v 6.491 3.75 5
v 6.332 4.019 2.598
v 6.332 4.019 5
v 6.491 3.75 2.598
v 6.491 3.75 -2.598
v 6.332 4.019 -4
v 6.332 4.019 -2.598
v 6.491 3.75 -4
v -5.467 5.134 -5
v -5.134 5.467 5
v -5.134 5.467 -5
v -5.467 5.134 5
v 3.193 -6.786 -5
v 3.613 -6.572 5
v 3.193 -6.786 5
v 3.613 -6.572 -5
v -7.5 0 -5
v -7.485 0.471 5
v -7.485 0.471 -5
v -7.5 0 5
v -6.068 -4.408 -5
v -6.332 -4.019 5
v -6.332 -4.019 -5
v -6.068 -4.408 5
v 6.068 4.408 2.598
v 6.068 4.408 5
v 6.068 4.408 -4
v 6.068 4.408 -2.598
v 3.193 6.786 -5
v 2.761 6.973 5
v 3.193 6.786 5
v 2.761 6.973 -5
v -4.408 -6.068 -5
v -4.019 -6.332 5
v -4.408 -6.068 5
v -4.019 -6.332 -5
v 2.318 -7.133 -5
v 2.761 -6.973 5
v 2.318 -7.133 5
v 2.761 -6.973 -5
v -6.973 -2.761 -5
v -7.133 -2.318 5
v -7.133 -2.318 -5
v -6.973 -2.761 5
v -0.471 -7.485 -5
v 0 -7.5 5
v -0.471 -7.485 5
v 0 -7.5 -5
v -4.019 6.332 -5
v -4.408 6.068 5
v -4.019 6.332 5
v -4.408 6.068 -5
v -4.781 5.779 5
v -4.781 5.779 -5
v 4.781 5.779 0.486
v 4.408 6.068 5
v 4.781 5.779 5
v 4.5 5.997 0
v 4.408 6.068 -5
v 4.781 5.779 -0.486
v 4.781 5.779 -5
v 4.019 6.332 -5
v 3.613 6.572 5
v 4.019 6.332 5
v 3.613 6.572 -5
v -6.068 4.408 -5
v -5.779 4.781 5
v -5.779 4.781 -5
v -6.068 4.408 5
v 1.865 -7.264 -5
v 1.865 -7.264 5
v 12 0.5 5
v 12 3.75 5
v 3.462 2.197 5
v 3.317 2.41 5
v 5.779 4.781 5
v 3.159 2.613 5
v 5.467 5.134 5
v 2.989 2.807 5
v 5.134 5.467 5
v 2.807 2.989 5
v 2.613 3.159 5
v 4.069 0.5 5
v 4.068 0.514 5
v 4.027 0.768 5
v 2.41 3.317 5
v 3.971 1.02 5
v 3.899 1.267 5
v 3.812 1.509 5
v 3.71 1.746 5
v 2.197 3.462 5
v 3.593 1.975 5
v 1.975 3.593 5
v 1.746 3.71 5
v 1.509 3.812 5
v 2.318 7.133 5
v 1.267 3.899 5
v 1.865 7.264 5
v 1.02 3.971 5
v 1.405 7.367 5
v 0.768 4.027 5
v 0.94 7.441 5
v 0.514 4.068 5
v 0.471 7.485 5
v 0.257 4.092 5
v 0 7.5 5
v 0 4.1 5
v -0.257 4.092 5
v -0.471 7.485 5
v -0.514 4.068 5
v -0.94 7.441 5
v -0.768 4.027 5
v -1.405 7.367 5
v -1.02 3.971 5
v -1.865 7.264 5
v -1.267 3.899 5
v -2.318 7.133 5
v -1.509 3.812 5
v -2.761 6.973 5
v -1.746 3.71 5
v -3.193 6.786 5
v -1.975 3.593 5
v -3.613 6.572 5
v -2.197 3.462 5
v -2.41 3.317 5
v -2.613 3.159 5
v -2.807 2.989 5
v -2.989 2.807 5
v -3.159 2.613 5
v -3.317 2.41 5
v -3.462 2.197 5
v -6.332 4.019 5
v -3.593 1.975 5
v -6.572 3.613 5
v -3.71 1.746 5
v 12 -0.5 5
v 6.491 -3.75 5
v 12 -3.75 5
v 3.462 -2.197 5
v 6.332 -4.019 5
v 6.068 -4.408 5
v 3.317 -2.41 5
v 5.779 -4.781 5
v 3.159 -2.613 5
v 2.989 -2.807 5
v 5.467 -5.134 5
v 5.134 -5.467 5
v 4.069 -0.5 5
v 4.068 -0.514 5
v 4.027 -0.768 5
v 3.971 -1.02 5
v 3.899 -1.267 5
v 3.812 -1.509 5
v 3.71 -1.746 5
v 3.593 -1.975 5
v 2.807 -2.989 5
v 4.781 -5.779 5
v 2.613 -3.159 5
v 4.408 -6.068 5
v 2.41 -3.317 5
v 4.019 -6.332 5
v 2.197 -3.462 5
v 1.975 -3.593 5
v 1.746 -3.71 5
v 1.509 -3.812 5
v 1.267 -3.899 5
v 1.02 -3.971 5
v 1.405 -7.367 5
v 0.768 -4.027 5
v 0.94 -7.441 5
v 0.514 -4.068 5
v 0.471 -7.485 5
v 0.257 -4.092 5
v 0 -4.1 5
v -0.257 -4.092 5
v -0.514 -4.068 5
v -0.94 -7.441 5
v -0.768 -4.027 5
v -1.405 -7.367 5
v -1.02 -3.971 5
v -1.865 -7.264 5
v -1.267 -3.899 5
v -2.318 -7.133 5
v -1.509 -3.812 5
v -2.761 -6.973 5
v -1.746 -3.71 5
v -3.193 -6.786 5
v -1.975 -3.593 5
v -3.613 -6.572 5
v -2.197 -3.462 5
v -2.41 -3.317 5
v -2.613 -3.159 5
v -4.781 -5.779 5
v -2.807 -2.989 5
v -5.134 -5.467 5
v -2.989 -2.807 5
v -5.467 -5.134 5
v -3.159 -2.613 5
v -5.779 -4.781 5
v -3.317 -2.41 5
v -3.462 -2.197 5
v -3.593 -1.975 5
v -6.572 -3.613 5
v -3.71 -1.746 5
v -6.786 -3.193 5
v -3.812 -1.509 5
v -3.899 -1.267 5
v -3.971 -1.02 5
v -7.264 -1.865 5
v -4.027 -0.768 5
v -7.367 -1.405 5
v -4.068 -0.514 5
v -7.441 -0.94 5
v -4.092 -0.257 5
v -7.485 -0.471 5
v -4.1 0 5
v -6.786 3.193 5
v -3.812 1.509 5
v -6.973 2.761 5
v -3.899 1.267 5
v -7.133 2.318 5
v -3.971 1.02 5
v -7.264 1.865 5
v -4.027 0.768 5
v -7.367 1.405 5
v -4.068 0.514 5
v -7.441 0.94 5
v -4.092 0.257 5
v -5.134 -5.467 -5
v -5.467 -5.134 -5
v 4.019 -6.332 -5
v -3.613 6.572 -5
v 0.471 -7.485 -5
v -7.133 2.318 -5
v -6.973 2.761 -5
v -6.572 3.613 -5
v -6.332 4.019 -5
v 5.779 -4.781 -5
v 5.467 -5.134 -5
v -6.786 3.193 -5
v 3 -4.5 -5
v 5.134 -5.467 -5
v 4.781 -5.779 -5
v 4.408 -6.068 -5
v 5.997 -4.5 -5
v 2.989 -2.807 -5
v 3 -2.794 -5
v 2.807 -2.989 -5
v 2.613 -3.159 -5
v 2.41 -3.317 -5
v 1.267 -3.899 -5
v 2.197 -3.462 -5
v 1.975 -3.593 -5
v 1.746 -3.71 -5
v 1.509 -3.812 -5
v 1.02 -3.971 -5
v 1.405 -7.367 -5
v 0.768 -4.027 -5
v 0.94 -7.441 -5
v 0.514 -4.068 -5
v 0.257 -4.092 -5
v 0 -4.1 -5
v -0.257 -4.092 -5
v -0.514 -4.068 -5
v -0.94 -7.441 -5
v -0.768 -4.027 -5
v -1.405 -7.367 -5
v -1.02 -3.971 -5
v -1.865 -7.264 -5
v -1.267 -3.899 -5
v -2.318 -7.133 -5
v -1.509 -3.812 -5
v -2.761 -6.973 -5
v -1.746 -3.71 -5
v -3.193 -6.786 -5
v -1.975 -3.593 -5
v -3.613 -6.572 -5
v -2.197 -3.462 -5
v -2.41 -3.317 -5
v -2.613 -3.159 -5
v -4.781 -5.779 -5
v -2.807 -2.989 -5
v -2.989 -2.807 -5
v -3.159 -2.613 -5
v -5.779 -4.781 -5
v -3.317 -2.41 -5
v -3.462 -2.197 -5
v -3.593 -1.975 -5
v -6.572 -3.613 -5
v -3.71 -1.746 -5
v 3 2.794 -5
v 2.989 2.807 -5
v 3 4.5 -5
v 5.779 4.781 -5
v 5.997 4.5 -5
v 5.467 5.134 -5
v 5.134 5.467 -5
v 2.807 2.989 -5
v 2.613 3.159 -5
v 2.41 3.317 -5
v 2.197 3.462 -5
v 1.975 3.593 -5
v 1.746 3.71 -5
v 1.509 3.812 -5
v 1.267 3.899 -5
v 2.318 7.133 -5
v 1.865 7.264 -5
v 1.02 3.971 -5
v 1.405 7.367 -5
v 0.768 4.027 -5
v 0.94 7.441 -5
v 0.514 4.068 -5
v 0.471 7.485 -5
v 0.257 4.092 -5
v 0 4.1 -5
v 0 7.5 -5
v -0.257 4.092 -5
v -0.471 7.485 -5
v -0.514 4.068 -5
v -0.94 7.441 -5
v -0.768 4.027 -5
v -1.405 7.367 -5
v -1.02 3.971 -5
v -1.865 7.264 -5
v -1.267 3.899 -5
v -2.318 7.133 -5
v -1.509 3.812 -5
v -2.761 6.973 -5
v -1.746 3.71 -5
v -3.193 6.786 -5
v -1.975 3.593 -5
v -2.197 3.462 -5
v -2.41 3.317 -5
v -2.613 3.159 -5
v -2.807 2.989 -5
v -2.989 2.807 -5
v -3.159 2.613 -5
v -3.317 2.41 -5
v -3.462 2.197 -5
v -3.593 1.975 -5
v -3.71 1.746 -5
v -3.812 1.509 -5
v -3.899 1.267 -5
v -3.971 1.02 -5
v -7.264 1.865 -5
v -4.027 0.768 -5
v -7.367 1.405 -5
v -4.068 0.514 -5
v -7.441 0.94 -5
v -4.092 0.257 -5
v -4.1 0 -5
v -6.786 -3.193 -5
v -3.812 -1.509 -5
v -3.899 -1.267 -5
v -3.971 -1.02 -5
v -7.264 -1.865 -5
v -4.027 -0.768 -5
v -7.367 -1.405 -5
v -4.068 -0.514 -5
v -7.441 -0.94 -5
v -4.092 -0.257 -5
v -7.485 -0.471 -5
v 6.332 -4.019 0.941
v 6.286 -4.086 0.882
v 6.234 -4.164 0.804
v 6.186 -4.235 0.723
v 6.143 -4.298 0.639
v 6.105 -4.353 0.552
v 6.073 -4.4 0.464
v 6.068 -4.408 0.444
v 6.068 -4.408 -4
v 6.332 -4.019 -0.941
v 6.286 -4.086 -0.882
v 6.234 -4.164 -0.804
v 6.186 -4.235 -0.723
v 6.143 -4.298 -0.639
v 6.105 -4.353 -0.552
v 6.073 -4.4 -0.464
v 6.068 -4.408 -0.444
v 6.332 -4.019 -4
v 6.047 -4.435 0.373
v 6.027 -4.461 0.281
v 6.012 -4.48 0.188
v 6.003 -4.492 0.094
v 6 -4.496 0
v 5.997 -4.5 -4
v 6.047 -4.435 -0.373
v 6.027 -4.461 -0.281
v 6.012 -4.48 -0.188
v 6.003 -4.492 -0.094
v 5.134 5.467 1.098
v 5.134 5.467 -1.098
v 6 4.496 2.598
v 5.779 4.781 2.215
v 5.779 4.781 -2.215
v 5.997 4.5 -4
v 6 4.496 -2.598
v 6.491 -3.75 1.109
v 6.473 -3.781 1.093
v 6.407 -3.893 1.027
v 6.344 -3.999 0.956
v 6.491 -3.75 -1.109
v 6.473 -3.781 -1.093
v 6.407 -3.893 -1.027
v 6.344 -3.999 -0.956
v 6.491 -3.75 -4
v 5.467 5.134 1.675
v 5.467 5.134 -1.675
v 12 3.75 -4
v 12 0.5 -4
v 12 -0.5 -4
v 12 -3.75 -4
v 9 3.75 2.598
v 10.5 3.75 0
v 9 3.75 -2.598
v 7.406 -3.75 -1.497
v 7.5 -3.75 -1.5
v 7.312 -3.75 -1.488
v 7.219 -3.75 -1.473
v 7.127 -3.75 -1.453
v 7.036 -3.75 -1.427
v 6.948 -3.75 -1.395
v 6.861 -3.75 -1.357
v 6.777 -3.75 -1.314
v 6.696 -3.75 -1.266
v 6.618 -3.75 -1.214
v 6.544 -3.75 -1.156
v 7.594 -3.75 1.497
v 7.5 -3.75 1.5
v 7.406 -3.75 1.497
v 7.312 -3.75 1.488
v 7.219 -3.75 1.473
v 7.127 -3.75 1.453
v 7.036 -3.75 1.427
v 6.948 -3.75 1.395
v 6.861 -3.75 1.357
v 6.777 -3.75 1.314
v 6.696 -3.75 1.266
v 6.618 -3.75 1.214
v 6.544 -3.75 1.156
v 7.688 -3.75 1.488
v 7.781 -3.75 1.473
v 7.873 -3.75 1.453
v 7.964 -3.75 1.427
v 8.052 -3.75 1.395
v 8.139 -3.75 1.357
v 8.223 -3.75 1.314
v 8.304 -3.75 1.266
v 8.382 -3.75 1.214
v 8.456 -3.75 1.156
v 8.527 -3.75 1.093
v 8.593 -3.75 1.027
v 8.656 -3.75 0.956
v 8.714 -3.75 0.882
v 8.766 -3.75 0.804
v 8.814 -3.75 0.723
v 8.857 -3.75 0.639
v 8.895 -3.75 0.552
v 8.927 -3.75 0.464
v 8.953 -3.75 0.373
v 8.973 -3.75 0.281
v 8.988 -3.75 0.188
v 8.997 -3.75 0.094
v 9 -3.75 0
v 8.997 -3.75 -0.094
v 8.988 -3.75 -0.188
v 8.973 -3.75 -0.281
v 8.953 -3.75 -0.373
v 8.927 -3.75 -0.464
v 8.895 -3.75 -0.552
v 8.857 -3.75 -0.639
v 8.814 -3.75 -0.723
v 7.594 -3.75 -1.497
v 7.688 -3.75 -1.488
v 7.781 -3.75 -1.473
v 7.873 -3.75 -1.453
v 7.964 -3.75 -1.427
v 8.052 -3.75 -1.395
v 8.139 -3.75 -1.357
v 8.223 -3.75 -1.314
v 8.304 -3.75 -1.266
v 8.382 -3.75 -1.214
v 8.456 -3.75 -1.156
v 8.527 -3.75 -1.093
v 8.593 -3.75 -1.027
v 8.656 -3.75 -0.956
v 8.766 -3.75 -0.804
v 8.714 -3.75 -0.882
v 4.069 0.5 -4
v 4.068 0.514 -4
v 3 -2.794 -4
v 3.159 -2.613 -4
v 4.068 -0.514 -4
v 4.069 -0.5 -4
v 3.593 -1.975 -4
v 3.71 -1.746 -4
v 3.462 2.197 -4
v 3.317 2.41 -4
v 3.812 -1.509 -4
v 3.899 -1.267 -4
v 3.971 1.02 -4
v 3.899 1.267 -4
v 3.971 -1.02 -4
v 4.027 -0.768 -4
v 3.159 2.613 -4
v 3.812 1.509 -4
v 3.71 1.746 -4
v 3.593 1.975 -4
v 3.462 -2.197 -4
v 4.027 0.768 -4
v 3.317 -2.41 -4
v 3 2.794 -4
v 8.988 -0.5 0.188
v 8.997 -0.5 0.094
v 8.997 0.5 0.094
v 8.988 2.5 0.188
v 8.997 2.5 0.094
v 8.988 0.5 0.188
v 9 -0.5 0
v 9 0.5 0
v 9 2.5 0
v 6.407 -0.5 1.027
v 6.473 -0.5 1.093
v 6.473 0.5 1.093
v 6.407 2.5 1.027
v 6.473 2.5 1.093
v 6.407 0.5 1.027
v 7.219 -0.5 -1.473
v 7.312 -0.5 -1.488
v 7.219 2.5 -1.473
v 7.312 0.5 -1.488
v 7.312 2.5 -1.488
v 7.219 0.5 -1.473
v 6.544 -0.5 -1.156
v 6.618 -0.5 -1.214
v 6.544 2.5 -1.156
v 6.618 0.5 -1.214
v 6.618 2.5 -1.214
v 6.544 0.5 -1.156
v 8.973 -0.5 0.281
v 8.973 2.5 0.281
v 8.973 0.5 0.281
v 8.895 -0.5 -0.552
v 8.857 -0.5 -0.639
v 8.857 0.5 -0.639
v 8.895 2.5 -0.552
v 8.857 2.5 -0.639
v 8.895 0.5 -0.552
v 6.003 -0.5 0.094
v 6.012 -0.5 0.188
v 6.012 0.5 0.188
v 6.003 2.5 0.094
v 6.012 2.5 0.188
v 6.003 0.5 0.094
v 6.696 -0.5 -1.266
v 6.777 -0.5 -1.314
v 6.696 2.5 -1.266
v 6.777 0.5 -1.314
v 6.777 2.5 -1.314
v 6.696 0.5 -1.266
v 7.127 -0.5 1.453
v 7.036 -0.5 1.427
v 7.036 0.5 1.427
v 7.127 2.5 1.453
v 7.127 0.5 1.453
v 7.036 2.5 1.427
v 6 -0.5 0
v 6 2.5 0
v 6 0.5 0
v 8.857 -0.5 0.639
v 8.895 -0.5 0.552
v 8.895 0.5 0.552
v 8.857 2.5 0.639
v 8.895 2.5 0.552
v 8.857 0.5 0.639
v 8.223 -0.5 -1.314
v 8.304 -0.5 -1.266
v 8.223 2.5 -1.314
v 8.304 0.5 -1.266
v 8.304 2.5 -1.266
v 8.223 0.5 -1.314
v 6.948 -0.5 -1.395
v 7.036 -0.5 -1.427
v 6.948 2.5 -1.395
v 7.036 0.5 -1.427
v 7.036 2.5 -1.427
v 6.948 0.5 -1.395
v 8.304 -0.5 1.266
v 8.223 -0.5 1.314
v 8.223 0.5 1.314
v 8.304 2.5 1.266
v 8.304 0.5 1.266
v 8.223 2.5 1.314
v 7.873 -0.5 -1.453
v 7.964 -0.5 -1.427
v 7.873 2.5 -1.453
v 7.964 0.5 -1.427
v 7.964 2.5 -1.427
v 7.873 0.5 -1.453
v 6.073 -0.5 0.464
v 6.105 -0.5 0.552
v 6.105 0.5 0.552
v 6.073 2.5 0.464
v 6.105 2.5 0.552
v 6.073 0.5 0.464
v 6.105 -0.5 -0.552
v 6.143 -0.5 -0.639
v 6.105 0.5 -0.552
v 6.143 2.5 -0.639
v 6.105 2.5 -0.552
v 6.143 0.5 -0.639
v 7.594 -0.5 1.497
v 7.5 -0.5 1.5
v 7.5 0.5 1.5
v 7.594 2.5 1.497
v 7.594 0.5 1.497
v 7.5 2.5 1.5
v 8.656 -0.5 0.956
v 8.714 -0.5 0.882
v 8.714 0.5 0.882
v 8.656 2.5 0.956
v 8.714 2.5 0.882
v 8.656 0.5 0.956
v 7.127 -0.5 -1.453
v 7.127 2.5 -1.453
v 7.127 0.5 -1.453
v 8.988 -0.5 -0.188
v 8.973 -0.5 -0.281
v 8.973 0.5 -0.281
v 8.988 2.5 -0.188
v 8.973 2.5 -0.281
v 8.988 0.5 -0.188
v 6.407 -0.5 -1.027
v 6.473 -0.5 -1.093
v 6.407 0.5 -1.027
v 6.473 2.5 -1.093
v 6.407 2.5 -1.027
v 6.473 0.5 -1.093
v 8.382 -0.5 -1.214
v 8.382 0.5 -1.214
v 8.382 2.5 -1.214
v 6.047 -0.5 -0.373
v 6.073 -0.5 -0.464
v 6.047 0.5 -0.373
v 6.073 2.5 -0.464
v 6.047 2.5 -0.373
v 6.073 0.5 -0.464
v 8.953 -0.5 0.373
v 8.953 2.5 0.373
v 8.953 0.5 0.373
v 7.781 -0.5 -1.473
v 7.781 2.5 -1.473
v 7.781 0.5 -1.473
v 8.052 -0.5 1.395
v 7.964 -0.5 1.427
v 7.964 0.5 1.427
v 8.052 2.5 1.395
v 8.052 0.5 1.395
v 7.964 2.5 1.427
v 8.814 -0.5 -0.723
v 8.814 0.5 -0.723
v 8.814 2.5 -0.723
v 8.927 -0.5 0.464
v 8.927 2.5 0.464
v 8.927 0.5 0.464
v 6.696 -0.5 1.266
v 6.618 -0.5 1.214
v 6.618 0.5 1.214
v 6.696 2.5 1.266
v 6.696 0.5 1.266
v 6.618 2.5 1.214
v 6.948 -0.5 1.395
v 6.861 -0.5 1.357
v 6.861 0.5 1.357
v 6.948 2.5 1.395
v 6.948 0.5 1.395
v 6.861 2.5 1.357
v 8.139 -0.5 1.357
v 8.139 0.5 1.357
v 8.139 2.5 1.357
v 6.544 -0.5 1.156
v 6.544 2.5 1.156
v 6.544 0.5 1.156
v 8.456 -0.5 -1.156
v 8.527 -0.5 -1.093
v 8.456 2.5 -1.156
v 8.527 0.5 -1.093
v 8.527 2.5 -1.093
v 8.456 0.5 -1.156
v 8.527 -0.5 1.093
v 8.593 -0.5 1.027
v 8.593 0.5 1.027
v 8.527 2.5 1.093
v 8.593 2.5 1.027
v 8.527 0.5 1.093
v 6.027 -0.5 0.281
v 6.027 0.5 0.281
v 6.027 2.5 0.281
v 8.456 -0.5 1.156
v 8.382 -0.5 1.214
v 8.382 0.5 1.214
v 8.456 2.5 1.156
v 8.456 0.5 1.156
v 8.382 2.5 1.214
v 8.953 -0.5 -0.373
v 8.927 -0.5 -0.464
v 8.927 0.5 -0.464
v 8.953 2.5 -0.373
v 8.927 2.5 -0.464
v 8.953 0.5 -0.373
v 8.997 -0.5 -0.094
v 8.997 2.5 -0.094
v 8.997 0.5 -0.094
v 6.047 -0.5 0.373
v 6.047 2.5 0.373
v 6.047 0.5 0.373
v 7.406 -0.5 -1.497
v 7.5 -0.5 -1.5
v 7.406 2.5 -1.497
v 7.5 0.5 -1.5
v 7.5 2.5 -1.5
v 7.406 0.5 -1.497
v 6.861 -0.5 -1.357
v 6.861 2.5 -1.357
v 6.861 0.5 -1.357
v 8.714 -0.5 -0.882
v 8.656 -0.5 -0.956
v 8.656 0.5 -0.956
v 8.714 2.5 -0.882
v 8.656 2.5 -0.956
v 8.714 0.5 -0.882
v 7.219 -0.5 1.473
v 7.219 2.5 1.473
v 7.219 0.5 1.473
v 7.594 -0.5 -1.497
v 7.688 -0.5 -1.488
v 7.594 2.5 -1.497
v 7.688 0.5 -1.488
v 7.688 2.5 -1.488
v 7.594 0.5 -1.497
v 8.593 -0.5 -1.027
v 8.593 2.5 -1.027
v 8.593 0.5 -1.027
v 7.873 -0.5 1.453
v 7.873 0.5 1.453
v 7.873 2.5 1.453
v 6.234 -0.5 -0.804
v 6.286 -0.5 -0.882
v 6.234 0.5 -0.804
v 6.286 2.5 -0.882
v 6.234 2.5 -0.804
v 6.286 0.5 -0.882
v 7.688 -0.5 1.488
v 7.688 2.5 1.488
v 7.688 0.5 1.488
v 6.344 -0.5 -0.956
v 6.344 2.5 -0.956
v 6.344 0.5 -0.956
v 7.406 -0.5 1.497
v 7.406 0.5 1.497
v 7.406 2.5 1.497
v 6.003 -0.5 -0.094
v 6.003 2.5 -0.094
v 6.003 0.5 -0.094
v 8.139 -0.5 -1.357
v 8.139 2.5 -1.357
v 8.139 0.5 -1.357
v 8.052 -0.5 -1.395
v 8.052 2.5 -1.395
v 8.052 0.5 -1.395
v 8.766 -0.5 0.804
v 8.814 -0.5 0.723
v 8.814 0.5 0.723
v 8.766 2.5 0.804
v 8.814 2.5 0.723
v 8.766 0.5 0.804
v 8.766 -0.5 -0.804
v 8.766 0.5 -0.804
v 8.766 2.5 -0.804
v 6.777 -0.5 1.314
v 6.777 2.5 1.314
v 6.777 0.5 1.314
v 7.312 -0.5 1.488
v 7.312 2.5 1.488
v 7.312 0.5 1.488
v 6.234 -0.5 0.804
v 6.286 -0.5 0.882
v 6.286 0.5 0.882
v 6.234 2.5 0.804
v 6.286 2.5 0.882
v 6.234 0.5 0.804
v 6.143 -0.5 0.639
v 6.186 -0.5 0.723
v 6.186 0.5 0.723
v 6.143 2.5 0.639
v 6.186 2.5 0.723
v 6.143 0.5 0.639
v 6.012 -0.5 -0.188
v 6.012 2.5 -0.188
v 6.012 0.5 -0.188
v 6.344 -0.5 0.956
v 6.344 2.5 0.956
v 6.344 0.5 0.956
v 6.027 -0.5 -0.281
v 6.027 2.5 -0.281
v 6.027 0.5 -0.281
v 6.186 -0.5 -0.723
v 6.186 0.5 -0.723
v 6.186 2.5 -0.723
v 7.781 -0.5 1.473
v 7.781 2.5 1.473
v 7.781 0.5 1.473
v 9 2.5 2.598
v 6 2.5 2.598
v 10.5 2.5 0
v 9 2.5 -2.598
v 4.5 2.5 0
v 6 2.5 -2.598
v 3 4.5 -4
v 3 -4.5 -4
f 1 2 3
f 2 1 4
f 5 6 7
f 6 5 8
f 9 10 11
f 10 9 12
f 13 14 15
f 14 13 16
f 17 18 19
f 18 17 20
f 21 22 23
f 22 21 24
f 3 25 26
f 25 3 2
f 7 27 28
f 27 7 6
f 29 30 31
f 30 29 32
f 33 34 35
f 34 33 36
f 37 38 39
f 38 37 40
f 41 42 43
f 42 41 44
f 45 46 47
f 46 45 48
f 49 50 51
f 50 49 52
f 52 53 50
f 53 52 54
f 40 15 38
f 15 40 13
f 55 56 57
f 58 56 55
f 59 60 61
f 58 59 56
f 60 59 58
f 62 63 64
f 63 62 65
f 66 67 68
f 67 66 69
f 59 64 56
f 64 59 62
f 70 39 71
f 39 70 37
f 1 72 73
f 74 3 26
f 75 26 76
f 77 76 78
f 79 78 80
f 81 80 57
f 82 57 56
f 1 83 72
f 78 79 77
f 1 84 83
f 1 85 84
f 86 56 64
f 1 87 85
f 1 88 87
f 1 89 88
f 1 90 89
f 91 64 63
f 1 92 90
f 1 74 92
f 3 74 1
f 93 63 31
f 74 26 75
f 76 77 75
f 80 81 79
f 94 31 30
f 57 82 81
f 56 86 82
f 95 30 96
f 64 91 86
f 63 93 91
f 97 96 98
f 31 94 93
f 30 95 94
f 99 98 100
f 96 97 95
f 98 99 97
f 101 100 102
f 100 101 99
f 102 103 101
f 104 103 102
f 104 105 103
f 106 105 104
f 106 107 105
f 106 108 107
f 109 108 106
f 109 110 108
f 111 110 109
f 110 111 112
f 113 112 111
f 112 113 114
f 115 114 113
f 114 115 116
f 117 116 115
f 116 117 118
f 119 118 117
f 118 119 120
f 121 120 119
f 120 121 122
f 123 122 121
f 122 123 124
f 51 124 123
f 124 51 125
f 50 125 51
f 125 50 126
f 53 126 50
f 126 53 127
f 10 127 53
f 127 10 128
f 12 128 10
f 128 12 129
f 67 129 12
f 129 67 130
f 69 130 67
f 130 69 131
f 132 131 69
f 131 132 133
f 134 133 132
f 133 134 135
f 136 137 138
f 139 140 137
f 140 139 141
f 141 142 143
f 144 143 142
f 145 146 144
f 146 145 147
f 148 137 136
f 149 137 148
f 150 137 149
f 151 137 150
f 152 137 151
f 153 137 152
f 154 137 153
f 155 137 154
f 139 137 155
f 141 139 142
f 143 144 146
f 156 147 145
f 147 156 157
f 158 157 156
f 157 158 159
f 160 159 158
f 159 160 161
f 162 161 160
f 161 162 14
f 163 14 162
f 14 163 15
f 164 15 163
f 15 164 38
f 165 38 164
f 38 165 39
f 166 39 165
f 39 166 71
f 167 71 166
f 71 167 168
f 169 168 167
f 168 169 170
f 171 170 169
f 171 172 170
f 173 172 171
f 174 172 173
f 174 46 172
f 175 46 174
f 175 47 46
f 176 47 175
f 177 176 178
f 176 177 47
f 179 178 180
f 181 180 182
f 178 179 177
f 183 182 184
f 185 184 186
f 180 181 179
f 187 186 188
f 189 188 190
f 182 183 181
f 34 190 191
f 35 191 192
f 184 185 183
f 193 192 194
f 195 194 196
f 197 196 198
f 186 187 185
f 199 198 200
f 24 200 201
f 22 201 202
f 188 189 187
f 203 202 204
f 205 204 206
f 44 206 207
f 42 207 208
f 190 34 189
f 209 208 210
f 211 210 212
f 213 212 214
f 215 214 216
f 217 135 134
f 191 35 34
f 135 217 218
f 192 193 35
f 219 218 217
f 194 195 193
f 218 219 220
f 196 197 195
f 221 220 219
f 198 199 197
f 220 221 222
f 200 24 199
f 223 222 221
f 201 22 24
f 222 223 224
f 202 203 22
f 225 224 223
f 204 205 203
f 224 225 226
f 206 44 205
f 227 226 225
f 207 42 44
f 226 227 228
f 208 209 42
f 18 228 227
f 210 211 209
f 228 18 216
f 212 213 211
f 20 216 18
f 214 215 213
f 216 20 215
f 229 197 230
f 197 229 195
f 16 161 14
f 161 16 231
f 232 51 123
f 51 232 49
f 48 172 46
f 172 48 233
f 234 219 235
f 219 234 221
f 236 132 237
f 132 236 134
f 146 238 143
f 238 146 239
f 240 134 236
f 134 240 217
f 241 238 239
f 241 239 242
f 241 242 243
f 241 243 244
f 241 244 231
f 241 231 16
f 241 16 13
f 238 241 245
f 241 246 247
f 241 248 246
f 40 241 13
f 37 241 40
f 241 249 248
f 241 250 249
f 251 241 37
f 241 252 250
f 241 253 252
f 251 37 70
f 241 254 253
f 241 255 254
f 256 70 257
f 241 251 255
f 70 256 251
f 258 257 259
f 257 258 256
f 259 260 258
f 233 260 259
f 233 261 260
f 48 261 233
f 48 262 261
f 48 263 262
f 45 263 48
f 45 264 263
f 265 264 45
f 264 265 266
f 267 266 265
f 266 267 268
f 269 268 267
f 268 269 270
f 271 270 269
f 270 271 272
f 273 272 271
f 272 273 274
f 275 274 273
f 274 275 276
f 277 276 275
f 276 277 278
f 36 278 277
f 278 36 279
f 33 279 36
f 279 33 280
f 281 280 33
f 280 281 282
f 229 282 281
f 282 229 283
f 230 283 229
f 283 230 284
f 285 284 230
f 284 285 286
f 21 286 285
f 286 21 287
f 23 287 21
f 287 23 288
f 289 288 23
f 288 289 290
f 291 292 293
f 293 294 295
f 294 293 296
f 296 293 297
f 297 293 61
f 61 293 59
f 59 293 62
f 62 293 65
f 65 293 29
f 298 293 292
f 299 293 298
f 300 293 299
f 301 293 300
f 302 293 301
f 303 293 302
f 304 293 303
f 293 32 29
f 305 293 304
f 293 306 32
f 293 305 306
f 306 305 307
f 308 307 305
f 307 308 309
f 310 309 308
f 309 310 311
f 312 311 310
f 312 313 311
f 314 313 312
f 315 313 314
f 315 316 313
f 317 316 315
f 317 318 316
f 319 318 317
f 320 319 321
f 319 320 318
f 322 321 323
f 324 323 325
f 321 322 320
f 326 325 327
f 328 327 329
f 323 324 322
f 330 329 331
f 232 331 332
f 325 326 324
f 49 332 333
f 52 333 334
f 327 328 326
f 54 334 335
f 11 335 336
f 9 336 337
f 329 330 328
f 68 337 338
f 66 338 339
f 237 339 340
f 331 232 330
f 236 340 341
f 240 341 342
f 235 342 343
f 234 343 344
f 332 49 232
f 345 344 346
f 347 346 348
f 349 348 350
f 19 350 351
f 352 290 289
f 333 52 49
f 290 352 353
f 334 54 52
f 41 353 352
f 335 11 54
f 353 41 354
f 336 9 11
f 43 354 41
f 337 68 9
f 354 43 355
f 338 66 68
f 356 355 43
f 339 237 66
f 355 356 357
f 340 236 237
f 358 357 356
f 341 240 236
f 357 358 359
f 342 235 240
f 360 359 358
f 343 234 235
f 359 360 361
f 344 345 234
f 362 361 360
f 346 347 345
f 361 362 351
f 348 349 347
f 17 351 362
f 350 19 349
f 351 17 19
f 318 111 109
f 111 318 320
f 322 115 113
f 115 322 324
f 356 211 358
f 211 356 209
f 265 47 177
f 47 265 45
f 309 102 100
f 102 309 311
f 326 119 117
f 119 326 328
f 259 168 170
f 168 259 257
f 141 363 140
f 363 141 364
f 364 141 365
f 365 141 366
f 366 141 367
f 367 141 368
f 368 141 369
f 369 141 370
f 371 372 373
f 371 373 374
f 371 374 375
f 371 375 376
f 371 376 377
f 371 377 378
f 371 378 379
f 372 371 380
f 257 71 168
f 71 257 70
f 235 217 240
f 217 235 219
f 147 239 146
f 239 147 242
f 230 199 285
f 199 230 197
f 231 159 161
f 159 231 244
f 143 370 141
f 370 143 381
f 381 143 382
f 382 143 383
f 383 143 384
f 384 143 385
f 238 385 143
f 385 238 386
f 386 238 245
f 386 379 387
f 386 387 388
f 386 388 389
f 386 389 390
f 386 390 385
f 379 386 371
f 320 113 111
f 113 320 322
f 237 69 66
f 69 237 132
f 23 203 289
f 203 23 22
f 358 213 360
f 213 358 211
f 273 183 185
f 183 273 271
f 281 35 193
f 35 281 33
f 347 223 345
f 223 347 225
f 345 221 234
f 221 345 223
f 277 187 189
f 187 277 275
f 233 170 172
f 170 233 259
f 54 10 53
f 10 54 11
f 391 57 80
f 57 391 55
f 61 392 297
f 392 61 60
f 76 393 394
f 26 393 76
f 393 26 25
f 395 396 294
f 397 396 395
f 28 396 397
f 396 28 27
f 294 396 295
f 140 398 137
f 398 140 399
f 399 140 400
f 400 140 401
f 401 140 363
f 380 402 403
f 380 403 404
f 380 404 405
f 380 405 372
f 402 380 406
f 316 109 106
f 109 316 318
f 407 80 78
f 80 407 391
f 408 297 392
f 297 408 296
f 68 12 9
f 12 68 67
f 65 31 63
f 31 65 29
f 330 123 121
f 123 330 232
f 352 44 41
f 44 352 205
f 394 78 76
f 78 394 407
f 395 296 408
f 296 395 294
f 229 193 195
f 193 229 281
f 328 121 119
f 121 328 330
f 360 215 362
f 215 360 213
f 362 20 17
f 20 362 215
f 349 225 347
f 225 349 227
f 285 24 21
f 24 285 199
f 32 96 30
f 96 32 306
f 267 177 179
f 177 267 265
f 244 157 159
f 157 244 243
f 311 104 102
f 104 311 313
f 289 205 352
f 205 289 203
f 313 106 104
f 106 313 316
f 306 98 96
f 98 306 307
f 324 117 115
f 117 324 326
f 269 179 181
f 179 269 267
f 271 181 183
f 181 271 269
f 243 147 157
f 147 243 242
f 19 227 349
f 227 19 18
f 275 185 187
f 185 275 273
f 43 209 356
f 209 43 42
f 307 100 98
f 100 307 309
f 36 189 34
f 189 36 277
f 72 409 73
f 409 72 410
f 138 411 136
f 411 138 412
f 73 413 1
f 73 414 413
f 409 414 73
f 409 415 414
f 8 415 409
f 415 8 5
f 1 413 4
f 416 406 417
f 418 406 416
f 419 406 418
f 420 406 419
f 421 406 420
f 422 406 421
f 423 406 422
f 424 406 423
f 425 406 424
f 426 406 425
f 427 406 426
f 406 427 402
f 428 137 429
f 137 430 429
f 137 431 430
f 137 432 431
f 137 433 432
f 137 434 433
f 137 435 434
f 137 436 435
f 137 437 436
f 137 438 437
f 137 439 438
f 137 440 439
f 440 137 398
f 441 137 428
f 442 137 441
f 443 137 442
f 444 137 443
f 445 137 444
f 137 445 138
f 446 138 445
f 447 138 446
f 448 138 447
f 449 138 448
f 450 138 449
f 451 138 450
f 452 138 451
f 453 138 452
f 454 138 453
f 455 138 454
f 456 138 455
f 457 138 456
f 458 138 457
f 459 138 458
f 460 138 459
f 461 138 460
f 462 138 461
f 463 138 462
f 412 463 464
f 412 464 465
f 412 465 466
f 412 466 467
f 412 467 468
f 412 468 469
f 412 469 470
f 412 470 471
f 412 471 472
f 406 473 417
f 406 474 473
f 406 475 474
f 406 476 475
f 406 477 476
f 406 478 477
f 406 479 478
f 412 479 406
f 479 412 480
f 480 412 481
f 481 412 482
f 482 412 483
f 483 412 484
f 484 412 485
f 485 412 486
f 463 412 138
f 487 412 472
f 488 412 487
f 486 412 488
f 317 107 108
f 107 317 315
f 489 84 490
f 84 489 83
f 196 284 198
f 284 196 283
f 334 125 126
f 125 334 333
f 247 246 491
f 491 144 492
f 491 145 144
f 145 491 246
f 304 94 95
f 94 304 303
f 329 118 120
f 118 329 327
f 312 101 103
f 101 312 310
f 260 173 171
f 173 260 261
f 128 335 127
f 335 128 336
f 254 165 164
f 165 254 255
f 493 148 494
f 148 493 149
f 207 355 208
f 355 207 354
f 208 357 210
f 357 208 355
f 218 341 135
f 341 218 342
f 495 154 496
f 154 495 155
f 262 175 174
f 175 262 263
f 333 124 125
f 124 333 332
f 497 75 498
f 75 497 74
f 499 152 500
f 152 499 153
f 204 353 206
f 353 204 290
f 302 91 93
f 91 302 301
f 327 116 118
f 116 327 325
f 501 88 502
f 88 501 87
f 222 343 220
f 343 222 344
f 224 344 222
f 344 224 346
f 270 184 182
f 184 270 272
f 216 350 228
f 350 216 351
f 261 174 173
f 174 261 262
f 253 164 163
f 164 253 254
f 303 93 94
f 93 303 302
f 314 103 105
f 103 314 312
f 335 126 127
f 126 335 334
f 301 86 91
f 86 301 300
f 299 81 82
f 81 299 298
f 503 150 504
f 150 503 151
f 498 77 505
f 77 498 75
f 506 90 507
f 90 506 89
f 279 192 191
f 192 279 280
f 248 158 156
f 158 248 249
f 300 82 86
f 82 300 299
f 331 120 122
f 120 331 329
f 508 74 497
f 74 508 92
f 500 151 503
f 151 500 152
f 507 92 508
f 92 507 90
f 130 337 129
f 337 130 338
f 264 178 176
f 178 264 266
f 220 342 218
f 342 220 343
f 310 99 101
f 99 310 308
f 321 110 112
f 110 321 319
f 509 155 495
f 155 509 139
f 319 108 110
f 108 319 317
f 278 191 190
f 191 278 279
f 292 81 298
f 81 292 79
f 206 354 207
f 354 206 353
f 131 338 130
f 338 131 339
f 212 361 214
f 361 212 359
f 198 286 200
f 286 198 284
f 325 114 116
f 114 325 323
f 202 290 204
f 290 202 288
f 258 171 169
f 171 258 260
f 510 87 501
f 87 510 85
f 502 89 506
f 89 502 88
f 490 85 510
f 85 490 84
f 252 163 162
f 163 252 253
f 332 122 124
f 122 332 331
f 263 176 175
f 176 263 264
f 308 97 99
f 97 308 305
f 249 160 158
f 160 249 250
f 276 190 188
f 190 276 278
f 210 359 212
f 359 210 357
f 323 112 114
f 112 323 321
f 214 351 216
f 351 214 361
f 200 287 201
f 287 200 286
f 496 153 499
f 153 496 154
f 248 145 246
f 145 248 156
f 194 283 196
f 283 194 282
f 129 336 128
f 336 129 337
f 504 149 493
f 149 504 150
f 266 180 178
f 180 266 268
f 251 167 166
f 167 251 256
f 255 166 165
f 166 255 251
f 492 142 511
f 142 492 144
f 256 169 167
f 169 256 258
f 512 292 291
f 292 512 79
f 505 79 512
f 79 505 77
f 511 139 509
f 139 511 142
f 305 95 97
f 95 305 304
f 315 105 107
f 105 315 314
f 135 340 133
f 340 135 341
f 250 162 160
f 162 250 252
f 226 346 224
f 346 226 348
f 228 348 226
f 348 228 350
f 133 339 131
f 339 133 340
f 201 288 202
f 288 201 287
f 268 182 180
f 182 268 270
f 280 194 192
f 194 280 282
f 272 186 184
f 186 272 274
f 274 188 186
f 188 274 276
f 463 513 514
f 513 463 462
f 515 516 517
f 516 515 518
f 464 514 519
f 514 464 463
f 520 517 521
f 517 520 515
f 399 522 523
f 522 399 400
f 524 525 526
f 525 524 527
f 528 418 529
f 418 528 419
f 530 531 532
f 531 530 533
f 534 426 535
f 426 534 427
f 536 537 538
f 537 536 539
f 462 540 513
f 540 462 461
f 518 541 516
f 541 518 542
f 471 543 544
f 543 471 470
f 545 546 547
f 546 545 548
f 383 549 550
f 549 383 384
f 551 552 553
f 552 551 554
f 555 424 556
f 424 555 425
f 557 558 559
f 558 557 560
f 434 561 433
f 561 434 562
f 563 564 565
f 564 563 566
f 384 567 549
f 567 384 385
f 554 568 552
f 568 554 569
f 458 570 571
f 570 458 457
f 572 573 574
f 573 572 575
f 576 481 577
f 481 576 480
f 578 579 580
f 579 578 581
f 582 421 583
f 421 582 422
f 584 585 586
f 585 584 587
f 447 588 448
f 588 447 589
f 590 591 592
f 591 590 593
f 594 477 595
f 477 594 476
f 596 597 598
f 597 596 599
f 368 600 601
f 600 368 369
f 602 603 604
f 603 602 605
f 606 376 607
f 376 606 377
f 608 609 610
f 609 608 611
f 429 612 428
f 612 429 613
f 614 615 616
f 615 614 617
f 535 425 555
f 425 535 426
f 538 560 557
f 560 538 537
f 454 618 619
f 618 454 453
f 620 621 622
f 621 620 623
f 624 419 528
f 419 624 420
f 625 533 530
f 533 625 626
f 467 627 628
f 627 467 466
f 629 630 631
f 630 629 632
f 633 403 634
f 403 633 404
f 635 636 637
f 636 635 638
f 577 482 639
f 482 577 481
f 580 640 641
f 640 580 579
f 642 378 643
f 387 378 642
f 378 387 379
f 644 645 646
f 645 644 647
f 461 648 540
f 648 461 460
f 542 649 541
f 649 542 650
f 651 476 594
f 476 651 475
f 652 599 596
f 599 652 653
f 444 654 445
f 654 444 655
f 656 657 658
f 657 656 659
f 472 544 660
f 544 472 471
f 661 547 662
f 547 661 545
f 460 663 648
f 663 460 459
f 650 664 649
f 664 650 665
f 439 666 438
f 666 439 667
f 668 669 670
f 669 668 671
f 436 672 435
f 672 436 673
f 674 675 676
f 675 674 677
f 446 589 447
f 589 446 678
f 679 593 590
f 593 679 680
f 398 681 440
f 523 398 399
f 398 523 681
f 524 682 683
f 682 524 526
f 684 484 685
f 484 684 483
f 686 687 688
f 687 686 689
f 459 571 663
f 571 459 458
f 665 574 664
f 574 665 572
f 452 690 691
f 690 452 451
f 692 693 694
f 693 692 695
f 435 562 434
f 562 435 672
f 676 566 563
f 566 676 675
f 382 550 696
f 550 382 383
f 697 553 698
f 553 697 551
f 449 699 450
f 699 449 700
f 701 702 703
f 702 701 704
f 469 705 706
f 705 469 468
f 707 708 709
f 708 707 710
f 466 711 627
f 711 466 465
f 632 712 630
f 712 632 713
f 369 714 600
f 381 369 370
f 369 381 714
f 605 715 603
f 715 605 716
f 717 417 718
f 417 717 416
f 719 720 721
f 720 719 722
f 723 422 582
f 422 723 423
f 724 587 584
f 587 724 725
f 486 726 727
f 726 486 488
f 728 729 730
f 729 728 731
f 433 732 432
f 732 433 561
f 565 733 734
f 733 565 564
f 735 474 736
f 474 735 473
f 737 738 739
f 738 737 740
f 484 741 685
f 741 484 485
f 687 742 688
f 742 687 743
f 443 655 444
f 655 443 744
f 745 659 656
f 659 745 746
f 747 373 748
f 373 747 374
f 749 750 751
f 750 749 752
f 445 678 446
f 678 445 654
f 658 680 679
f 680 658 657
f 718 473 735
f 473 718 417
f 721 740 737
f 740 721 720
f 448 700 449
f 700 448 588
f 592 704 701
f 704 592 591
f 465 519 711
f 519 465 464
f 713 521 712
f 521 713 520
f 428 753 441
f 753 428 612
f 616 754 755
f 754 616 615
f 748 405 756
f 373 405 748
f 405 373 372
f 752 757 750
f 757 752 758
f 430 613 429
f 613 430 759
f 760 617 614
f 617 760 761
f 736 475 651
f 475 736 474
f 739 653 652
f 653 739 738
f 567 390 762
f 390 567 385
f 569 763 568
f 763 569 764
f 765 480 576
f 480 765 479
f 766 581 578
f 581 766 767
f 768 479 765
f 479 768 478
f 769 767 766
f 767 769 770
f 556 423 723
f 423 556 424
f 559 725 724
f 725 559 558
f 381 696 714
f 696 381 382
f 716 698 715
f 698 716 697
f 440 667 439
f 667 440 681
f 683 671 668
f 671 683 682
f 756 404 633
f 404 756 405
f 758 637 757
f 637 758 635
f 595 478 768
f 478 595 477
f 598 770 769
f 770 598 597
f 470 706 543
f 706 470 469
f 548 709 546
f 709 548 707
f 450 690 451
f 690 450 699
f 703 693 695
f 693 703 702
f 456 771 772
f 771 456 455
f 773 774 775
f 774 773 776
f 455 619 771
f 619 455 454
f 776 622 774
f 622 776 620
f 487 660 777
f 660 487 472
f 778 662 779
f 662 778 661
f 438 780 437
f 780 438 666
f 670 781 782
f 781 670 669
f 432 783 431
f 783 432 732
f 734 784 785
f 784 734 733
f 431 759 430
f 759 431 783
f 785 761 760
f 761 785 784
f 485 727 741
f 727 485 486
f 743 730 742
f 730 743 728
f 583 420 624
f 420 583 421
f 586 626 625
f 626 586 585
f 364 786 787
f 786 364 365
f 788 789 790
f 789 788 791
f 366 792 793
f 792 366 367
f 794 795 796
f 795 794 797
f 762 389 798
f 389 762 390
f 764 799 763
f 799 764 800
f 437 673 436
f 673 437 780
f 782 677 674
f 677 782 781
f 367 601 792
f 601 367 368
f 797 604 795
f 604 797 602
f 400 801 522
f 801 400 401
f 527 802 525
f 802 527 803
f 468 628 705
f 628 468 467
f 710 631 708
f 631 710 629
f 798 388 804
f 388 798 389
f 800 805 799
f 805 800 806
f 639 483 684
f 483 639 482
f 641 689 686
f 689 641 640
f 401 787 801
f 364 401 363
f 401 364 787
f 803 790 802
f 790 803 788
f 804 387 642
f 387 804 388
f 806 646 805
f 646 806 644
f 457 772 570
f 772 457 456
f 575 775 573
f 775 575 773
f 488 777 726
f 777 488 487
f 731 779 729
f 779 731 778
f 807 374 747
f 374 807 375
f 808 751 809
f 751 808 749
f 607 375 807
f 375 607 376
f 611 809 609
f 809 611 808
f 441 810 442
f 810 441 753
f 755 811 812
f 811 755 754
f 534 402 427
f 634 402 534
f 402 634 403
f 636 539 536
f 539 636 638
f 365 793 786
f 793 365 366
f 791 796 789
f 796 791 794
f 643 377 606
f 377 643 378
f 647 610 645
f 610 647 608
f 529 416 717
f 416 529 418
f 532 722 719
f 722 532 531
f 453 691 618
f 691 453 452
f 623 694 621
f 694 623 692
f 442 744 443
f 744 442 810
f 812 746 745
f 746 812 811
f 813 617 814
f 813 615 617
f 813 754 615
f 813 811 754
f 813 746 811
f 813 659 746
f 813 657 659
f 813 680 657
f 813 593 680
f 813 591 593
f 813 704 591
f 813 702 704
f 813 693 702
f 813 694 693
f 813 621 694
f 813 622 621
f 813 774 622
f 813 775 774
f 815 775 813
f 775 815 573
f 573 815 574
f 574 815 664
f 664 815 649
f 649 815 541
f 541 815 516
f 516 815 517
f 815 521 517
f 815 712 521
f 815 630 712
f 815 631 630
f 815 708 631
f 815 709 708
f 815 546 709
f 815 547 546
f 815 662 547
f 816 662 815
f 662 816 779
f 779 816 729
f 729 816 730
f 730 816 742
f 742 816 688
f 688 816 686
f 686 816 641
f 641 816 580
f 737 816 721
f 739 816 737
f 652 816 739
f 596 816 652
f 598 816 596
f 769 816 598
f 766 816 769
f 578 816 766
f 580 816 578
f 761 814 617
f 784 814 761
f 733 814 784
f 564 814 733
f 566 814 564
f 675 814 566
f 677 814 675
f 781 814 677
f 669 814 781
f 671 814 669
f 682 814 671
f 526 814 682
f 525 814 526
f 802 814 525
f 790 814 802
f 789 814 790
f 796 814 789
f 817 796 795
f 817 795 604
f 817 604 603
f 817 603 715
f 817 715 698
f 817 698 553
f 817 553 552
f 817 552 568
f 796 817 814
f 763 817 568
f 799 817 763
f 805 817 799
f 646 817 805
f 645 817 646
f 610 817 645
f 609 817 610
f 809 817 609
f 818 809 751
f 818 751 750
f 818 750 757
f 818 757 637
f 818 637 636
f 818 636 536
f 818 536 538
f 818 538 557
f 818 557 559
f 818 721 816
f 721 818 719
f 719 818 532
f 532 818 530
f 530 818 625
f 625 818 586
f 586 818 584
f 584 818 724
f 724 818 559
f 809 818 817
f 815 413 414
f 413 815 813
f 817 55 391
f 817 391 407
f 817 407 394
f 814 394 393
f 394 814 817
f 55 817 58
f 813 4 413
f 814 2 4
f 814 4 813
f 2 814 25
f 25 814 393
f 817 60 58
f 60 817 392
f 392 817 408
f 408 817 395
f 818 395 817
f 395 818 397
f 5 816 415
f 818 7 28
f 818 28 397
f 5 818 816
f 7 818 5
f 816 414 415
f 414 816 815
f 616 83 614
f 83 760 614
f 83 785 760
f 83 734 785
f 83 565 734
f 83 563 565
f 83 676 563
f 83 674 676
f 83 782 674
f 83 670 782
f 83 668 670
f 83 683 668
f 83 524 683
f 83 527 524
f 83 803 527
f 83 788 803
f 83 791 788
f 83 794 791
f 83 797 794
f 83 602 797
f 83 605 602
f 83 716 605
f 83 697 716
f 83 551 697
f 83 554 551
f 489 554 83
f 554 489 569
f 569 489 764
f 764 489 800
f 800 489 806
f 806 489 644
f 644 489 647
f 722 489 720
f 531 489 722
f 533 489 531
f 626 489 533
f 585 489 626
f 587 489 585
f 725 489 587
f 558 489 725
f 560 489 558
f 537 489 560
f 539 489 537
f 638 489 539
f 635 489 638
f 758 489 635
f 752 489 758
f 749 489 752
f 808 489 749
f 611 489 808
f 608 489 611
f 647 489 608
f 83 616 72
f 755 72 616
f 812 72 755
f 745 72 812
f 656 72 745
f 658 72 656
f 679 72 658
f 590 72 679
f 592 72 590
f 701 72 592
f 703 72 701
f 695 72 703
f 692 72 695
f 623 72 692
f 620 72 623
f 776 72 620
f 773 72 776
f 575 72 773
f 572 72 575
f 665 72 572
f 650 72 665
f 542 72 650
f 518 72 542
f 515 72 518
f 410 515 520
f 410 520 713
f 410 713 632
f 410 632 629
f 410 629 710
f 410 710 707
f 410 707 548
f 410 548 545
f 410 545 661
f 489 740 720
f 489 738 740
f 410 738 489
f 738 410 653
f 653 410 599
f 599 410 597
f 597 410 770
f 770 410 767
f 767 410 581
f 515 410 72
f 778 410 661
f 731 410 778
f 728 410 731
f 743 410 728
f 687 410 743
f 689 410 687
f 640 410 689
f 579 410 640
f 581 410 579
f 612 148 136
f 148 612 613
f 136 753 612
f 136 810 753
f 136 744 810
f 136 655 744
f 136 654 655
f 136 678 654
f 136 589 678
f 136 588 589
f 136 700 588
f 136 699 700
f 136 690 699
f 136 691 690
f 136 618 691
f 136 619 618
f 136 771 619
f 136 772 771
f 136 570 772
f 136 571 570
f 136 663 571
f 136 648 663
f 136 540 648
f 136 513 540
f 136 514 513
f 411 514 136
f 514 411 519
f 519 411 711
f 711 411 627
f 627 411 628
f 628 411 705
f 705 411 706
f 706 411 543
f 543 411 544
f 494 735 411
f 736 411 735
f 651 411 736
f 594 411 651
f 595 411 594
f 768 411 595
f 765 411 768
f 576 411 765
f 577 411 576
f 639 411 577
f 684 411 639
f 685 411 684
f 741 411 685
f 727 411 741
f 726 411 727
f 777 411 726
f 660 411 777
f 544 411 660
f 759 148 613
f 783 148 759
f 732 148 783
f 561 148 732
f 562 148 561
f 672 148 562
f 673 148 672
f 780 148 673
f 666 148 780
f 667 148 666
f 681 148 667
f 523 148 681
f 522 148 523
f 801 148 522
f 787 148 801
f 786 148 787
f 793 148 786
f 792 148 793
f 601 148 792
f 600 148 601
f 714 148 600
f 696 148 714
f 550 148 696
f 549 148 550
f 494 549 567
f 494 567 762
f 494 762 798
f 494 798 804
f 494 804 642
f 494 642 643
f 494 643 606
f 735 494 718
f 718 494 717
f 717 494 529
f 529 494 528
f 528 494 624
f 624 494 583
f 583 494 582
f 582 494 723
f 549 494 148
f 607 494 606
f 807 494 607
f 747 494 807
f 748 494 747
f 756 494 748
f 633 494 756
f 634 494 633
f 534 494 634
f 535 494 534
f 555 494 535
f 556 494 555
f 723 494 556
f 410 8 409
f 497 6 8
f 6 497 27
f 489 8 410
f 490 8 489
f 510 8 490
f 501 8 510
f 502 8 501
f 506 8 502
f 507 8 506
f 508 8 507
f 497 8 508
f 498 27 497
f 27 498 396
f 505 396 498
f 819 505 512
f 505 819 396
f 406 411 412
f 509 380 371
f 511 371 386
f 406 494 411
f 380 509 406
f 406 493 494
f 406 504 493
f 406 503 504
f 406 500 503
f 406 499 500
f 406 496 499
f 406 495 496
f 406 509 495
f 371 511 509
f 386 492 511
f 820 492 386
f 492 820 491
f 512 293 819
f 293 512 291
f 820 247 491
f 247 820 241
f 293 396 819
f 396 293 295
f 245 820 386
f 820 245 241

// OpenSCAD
$fn = 100;

nema_14_shaft_d = 5;
nema_17_shaft_d = 5;
nema_23_shaft_d = 8;

module nut(
    side_length
) {
    for(i = [0 : 5]) {
        rotate([0, 0, i * 60])
            polygon([
                [0, 0],
                [side_length / 2, sqrt(3) / 2 * side_length],
                [-side_length / 2, sqrt(3) / 2 * side_length],
            ]);
    }
}

module clamping_hub(
    id, 
    od, 
    clamp_thickness,
    slit_width, 
    screw_d,
    screw_l
) {
    clearance = 0.2;
    difference() {
        union() {
            cylinder(d = od, h = clamp_thickness, center = true);
            translate([od / 2, 0, 0])
                cube([screw_d * 3, screw_d * 2.5, clamp_thickness], center = true);
        }
        cylinder(d = id + clearance, h = 100, center = true); //shaft_bore

        translate([od / 2, 0, 0]) 
            rotate([90, 0, 0])
                cylinder(d = screw_d, h = screw_l, center = true); //screw input
        translate([od / 2, screw_l / 2 + 2.5, 0]) 
            rotate([90, 0, 0])
                linear_extrude(screw_l / 2)
                    nut(screw_d); //nut trap
        
        translate([od / 2, 0, 0]) 
            rotate([0, 0, 90])
                cube([slit_width, od / 2 + screw_d, clamp_thickness], center = true); //slit

        translate([od / 2, 0, -clamp_thickness / 2 + 0.5])
            cube([screw_d * 3, screw_d * 3, 1], center = true);
    }
}

od = 15; 
clamp_thickness = 10;
slit_width = 1;
screw_d = 3;
screw_l = 20;

clamping_hub(
    nema_23_shaft_d,
    od, 
    clamp_thickness,
    slit_width, 
    screw_d,
    screw_l
);
